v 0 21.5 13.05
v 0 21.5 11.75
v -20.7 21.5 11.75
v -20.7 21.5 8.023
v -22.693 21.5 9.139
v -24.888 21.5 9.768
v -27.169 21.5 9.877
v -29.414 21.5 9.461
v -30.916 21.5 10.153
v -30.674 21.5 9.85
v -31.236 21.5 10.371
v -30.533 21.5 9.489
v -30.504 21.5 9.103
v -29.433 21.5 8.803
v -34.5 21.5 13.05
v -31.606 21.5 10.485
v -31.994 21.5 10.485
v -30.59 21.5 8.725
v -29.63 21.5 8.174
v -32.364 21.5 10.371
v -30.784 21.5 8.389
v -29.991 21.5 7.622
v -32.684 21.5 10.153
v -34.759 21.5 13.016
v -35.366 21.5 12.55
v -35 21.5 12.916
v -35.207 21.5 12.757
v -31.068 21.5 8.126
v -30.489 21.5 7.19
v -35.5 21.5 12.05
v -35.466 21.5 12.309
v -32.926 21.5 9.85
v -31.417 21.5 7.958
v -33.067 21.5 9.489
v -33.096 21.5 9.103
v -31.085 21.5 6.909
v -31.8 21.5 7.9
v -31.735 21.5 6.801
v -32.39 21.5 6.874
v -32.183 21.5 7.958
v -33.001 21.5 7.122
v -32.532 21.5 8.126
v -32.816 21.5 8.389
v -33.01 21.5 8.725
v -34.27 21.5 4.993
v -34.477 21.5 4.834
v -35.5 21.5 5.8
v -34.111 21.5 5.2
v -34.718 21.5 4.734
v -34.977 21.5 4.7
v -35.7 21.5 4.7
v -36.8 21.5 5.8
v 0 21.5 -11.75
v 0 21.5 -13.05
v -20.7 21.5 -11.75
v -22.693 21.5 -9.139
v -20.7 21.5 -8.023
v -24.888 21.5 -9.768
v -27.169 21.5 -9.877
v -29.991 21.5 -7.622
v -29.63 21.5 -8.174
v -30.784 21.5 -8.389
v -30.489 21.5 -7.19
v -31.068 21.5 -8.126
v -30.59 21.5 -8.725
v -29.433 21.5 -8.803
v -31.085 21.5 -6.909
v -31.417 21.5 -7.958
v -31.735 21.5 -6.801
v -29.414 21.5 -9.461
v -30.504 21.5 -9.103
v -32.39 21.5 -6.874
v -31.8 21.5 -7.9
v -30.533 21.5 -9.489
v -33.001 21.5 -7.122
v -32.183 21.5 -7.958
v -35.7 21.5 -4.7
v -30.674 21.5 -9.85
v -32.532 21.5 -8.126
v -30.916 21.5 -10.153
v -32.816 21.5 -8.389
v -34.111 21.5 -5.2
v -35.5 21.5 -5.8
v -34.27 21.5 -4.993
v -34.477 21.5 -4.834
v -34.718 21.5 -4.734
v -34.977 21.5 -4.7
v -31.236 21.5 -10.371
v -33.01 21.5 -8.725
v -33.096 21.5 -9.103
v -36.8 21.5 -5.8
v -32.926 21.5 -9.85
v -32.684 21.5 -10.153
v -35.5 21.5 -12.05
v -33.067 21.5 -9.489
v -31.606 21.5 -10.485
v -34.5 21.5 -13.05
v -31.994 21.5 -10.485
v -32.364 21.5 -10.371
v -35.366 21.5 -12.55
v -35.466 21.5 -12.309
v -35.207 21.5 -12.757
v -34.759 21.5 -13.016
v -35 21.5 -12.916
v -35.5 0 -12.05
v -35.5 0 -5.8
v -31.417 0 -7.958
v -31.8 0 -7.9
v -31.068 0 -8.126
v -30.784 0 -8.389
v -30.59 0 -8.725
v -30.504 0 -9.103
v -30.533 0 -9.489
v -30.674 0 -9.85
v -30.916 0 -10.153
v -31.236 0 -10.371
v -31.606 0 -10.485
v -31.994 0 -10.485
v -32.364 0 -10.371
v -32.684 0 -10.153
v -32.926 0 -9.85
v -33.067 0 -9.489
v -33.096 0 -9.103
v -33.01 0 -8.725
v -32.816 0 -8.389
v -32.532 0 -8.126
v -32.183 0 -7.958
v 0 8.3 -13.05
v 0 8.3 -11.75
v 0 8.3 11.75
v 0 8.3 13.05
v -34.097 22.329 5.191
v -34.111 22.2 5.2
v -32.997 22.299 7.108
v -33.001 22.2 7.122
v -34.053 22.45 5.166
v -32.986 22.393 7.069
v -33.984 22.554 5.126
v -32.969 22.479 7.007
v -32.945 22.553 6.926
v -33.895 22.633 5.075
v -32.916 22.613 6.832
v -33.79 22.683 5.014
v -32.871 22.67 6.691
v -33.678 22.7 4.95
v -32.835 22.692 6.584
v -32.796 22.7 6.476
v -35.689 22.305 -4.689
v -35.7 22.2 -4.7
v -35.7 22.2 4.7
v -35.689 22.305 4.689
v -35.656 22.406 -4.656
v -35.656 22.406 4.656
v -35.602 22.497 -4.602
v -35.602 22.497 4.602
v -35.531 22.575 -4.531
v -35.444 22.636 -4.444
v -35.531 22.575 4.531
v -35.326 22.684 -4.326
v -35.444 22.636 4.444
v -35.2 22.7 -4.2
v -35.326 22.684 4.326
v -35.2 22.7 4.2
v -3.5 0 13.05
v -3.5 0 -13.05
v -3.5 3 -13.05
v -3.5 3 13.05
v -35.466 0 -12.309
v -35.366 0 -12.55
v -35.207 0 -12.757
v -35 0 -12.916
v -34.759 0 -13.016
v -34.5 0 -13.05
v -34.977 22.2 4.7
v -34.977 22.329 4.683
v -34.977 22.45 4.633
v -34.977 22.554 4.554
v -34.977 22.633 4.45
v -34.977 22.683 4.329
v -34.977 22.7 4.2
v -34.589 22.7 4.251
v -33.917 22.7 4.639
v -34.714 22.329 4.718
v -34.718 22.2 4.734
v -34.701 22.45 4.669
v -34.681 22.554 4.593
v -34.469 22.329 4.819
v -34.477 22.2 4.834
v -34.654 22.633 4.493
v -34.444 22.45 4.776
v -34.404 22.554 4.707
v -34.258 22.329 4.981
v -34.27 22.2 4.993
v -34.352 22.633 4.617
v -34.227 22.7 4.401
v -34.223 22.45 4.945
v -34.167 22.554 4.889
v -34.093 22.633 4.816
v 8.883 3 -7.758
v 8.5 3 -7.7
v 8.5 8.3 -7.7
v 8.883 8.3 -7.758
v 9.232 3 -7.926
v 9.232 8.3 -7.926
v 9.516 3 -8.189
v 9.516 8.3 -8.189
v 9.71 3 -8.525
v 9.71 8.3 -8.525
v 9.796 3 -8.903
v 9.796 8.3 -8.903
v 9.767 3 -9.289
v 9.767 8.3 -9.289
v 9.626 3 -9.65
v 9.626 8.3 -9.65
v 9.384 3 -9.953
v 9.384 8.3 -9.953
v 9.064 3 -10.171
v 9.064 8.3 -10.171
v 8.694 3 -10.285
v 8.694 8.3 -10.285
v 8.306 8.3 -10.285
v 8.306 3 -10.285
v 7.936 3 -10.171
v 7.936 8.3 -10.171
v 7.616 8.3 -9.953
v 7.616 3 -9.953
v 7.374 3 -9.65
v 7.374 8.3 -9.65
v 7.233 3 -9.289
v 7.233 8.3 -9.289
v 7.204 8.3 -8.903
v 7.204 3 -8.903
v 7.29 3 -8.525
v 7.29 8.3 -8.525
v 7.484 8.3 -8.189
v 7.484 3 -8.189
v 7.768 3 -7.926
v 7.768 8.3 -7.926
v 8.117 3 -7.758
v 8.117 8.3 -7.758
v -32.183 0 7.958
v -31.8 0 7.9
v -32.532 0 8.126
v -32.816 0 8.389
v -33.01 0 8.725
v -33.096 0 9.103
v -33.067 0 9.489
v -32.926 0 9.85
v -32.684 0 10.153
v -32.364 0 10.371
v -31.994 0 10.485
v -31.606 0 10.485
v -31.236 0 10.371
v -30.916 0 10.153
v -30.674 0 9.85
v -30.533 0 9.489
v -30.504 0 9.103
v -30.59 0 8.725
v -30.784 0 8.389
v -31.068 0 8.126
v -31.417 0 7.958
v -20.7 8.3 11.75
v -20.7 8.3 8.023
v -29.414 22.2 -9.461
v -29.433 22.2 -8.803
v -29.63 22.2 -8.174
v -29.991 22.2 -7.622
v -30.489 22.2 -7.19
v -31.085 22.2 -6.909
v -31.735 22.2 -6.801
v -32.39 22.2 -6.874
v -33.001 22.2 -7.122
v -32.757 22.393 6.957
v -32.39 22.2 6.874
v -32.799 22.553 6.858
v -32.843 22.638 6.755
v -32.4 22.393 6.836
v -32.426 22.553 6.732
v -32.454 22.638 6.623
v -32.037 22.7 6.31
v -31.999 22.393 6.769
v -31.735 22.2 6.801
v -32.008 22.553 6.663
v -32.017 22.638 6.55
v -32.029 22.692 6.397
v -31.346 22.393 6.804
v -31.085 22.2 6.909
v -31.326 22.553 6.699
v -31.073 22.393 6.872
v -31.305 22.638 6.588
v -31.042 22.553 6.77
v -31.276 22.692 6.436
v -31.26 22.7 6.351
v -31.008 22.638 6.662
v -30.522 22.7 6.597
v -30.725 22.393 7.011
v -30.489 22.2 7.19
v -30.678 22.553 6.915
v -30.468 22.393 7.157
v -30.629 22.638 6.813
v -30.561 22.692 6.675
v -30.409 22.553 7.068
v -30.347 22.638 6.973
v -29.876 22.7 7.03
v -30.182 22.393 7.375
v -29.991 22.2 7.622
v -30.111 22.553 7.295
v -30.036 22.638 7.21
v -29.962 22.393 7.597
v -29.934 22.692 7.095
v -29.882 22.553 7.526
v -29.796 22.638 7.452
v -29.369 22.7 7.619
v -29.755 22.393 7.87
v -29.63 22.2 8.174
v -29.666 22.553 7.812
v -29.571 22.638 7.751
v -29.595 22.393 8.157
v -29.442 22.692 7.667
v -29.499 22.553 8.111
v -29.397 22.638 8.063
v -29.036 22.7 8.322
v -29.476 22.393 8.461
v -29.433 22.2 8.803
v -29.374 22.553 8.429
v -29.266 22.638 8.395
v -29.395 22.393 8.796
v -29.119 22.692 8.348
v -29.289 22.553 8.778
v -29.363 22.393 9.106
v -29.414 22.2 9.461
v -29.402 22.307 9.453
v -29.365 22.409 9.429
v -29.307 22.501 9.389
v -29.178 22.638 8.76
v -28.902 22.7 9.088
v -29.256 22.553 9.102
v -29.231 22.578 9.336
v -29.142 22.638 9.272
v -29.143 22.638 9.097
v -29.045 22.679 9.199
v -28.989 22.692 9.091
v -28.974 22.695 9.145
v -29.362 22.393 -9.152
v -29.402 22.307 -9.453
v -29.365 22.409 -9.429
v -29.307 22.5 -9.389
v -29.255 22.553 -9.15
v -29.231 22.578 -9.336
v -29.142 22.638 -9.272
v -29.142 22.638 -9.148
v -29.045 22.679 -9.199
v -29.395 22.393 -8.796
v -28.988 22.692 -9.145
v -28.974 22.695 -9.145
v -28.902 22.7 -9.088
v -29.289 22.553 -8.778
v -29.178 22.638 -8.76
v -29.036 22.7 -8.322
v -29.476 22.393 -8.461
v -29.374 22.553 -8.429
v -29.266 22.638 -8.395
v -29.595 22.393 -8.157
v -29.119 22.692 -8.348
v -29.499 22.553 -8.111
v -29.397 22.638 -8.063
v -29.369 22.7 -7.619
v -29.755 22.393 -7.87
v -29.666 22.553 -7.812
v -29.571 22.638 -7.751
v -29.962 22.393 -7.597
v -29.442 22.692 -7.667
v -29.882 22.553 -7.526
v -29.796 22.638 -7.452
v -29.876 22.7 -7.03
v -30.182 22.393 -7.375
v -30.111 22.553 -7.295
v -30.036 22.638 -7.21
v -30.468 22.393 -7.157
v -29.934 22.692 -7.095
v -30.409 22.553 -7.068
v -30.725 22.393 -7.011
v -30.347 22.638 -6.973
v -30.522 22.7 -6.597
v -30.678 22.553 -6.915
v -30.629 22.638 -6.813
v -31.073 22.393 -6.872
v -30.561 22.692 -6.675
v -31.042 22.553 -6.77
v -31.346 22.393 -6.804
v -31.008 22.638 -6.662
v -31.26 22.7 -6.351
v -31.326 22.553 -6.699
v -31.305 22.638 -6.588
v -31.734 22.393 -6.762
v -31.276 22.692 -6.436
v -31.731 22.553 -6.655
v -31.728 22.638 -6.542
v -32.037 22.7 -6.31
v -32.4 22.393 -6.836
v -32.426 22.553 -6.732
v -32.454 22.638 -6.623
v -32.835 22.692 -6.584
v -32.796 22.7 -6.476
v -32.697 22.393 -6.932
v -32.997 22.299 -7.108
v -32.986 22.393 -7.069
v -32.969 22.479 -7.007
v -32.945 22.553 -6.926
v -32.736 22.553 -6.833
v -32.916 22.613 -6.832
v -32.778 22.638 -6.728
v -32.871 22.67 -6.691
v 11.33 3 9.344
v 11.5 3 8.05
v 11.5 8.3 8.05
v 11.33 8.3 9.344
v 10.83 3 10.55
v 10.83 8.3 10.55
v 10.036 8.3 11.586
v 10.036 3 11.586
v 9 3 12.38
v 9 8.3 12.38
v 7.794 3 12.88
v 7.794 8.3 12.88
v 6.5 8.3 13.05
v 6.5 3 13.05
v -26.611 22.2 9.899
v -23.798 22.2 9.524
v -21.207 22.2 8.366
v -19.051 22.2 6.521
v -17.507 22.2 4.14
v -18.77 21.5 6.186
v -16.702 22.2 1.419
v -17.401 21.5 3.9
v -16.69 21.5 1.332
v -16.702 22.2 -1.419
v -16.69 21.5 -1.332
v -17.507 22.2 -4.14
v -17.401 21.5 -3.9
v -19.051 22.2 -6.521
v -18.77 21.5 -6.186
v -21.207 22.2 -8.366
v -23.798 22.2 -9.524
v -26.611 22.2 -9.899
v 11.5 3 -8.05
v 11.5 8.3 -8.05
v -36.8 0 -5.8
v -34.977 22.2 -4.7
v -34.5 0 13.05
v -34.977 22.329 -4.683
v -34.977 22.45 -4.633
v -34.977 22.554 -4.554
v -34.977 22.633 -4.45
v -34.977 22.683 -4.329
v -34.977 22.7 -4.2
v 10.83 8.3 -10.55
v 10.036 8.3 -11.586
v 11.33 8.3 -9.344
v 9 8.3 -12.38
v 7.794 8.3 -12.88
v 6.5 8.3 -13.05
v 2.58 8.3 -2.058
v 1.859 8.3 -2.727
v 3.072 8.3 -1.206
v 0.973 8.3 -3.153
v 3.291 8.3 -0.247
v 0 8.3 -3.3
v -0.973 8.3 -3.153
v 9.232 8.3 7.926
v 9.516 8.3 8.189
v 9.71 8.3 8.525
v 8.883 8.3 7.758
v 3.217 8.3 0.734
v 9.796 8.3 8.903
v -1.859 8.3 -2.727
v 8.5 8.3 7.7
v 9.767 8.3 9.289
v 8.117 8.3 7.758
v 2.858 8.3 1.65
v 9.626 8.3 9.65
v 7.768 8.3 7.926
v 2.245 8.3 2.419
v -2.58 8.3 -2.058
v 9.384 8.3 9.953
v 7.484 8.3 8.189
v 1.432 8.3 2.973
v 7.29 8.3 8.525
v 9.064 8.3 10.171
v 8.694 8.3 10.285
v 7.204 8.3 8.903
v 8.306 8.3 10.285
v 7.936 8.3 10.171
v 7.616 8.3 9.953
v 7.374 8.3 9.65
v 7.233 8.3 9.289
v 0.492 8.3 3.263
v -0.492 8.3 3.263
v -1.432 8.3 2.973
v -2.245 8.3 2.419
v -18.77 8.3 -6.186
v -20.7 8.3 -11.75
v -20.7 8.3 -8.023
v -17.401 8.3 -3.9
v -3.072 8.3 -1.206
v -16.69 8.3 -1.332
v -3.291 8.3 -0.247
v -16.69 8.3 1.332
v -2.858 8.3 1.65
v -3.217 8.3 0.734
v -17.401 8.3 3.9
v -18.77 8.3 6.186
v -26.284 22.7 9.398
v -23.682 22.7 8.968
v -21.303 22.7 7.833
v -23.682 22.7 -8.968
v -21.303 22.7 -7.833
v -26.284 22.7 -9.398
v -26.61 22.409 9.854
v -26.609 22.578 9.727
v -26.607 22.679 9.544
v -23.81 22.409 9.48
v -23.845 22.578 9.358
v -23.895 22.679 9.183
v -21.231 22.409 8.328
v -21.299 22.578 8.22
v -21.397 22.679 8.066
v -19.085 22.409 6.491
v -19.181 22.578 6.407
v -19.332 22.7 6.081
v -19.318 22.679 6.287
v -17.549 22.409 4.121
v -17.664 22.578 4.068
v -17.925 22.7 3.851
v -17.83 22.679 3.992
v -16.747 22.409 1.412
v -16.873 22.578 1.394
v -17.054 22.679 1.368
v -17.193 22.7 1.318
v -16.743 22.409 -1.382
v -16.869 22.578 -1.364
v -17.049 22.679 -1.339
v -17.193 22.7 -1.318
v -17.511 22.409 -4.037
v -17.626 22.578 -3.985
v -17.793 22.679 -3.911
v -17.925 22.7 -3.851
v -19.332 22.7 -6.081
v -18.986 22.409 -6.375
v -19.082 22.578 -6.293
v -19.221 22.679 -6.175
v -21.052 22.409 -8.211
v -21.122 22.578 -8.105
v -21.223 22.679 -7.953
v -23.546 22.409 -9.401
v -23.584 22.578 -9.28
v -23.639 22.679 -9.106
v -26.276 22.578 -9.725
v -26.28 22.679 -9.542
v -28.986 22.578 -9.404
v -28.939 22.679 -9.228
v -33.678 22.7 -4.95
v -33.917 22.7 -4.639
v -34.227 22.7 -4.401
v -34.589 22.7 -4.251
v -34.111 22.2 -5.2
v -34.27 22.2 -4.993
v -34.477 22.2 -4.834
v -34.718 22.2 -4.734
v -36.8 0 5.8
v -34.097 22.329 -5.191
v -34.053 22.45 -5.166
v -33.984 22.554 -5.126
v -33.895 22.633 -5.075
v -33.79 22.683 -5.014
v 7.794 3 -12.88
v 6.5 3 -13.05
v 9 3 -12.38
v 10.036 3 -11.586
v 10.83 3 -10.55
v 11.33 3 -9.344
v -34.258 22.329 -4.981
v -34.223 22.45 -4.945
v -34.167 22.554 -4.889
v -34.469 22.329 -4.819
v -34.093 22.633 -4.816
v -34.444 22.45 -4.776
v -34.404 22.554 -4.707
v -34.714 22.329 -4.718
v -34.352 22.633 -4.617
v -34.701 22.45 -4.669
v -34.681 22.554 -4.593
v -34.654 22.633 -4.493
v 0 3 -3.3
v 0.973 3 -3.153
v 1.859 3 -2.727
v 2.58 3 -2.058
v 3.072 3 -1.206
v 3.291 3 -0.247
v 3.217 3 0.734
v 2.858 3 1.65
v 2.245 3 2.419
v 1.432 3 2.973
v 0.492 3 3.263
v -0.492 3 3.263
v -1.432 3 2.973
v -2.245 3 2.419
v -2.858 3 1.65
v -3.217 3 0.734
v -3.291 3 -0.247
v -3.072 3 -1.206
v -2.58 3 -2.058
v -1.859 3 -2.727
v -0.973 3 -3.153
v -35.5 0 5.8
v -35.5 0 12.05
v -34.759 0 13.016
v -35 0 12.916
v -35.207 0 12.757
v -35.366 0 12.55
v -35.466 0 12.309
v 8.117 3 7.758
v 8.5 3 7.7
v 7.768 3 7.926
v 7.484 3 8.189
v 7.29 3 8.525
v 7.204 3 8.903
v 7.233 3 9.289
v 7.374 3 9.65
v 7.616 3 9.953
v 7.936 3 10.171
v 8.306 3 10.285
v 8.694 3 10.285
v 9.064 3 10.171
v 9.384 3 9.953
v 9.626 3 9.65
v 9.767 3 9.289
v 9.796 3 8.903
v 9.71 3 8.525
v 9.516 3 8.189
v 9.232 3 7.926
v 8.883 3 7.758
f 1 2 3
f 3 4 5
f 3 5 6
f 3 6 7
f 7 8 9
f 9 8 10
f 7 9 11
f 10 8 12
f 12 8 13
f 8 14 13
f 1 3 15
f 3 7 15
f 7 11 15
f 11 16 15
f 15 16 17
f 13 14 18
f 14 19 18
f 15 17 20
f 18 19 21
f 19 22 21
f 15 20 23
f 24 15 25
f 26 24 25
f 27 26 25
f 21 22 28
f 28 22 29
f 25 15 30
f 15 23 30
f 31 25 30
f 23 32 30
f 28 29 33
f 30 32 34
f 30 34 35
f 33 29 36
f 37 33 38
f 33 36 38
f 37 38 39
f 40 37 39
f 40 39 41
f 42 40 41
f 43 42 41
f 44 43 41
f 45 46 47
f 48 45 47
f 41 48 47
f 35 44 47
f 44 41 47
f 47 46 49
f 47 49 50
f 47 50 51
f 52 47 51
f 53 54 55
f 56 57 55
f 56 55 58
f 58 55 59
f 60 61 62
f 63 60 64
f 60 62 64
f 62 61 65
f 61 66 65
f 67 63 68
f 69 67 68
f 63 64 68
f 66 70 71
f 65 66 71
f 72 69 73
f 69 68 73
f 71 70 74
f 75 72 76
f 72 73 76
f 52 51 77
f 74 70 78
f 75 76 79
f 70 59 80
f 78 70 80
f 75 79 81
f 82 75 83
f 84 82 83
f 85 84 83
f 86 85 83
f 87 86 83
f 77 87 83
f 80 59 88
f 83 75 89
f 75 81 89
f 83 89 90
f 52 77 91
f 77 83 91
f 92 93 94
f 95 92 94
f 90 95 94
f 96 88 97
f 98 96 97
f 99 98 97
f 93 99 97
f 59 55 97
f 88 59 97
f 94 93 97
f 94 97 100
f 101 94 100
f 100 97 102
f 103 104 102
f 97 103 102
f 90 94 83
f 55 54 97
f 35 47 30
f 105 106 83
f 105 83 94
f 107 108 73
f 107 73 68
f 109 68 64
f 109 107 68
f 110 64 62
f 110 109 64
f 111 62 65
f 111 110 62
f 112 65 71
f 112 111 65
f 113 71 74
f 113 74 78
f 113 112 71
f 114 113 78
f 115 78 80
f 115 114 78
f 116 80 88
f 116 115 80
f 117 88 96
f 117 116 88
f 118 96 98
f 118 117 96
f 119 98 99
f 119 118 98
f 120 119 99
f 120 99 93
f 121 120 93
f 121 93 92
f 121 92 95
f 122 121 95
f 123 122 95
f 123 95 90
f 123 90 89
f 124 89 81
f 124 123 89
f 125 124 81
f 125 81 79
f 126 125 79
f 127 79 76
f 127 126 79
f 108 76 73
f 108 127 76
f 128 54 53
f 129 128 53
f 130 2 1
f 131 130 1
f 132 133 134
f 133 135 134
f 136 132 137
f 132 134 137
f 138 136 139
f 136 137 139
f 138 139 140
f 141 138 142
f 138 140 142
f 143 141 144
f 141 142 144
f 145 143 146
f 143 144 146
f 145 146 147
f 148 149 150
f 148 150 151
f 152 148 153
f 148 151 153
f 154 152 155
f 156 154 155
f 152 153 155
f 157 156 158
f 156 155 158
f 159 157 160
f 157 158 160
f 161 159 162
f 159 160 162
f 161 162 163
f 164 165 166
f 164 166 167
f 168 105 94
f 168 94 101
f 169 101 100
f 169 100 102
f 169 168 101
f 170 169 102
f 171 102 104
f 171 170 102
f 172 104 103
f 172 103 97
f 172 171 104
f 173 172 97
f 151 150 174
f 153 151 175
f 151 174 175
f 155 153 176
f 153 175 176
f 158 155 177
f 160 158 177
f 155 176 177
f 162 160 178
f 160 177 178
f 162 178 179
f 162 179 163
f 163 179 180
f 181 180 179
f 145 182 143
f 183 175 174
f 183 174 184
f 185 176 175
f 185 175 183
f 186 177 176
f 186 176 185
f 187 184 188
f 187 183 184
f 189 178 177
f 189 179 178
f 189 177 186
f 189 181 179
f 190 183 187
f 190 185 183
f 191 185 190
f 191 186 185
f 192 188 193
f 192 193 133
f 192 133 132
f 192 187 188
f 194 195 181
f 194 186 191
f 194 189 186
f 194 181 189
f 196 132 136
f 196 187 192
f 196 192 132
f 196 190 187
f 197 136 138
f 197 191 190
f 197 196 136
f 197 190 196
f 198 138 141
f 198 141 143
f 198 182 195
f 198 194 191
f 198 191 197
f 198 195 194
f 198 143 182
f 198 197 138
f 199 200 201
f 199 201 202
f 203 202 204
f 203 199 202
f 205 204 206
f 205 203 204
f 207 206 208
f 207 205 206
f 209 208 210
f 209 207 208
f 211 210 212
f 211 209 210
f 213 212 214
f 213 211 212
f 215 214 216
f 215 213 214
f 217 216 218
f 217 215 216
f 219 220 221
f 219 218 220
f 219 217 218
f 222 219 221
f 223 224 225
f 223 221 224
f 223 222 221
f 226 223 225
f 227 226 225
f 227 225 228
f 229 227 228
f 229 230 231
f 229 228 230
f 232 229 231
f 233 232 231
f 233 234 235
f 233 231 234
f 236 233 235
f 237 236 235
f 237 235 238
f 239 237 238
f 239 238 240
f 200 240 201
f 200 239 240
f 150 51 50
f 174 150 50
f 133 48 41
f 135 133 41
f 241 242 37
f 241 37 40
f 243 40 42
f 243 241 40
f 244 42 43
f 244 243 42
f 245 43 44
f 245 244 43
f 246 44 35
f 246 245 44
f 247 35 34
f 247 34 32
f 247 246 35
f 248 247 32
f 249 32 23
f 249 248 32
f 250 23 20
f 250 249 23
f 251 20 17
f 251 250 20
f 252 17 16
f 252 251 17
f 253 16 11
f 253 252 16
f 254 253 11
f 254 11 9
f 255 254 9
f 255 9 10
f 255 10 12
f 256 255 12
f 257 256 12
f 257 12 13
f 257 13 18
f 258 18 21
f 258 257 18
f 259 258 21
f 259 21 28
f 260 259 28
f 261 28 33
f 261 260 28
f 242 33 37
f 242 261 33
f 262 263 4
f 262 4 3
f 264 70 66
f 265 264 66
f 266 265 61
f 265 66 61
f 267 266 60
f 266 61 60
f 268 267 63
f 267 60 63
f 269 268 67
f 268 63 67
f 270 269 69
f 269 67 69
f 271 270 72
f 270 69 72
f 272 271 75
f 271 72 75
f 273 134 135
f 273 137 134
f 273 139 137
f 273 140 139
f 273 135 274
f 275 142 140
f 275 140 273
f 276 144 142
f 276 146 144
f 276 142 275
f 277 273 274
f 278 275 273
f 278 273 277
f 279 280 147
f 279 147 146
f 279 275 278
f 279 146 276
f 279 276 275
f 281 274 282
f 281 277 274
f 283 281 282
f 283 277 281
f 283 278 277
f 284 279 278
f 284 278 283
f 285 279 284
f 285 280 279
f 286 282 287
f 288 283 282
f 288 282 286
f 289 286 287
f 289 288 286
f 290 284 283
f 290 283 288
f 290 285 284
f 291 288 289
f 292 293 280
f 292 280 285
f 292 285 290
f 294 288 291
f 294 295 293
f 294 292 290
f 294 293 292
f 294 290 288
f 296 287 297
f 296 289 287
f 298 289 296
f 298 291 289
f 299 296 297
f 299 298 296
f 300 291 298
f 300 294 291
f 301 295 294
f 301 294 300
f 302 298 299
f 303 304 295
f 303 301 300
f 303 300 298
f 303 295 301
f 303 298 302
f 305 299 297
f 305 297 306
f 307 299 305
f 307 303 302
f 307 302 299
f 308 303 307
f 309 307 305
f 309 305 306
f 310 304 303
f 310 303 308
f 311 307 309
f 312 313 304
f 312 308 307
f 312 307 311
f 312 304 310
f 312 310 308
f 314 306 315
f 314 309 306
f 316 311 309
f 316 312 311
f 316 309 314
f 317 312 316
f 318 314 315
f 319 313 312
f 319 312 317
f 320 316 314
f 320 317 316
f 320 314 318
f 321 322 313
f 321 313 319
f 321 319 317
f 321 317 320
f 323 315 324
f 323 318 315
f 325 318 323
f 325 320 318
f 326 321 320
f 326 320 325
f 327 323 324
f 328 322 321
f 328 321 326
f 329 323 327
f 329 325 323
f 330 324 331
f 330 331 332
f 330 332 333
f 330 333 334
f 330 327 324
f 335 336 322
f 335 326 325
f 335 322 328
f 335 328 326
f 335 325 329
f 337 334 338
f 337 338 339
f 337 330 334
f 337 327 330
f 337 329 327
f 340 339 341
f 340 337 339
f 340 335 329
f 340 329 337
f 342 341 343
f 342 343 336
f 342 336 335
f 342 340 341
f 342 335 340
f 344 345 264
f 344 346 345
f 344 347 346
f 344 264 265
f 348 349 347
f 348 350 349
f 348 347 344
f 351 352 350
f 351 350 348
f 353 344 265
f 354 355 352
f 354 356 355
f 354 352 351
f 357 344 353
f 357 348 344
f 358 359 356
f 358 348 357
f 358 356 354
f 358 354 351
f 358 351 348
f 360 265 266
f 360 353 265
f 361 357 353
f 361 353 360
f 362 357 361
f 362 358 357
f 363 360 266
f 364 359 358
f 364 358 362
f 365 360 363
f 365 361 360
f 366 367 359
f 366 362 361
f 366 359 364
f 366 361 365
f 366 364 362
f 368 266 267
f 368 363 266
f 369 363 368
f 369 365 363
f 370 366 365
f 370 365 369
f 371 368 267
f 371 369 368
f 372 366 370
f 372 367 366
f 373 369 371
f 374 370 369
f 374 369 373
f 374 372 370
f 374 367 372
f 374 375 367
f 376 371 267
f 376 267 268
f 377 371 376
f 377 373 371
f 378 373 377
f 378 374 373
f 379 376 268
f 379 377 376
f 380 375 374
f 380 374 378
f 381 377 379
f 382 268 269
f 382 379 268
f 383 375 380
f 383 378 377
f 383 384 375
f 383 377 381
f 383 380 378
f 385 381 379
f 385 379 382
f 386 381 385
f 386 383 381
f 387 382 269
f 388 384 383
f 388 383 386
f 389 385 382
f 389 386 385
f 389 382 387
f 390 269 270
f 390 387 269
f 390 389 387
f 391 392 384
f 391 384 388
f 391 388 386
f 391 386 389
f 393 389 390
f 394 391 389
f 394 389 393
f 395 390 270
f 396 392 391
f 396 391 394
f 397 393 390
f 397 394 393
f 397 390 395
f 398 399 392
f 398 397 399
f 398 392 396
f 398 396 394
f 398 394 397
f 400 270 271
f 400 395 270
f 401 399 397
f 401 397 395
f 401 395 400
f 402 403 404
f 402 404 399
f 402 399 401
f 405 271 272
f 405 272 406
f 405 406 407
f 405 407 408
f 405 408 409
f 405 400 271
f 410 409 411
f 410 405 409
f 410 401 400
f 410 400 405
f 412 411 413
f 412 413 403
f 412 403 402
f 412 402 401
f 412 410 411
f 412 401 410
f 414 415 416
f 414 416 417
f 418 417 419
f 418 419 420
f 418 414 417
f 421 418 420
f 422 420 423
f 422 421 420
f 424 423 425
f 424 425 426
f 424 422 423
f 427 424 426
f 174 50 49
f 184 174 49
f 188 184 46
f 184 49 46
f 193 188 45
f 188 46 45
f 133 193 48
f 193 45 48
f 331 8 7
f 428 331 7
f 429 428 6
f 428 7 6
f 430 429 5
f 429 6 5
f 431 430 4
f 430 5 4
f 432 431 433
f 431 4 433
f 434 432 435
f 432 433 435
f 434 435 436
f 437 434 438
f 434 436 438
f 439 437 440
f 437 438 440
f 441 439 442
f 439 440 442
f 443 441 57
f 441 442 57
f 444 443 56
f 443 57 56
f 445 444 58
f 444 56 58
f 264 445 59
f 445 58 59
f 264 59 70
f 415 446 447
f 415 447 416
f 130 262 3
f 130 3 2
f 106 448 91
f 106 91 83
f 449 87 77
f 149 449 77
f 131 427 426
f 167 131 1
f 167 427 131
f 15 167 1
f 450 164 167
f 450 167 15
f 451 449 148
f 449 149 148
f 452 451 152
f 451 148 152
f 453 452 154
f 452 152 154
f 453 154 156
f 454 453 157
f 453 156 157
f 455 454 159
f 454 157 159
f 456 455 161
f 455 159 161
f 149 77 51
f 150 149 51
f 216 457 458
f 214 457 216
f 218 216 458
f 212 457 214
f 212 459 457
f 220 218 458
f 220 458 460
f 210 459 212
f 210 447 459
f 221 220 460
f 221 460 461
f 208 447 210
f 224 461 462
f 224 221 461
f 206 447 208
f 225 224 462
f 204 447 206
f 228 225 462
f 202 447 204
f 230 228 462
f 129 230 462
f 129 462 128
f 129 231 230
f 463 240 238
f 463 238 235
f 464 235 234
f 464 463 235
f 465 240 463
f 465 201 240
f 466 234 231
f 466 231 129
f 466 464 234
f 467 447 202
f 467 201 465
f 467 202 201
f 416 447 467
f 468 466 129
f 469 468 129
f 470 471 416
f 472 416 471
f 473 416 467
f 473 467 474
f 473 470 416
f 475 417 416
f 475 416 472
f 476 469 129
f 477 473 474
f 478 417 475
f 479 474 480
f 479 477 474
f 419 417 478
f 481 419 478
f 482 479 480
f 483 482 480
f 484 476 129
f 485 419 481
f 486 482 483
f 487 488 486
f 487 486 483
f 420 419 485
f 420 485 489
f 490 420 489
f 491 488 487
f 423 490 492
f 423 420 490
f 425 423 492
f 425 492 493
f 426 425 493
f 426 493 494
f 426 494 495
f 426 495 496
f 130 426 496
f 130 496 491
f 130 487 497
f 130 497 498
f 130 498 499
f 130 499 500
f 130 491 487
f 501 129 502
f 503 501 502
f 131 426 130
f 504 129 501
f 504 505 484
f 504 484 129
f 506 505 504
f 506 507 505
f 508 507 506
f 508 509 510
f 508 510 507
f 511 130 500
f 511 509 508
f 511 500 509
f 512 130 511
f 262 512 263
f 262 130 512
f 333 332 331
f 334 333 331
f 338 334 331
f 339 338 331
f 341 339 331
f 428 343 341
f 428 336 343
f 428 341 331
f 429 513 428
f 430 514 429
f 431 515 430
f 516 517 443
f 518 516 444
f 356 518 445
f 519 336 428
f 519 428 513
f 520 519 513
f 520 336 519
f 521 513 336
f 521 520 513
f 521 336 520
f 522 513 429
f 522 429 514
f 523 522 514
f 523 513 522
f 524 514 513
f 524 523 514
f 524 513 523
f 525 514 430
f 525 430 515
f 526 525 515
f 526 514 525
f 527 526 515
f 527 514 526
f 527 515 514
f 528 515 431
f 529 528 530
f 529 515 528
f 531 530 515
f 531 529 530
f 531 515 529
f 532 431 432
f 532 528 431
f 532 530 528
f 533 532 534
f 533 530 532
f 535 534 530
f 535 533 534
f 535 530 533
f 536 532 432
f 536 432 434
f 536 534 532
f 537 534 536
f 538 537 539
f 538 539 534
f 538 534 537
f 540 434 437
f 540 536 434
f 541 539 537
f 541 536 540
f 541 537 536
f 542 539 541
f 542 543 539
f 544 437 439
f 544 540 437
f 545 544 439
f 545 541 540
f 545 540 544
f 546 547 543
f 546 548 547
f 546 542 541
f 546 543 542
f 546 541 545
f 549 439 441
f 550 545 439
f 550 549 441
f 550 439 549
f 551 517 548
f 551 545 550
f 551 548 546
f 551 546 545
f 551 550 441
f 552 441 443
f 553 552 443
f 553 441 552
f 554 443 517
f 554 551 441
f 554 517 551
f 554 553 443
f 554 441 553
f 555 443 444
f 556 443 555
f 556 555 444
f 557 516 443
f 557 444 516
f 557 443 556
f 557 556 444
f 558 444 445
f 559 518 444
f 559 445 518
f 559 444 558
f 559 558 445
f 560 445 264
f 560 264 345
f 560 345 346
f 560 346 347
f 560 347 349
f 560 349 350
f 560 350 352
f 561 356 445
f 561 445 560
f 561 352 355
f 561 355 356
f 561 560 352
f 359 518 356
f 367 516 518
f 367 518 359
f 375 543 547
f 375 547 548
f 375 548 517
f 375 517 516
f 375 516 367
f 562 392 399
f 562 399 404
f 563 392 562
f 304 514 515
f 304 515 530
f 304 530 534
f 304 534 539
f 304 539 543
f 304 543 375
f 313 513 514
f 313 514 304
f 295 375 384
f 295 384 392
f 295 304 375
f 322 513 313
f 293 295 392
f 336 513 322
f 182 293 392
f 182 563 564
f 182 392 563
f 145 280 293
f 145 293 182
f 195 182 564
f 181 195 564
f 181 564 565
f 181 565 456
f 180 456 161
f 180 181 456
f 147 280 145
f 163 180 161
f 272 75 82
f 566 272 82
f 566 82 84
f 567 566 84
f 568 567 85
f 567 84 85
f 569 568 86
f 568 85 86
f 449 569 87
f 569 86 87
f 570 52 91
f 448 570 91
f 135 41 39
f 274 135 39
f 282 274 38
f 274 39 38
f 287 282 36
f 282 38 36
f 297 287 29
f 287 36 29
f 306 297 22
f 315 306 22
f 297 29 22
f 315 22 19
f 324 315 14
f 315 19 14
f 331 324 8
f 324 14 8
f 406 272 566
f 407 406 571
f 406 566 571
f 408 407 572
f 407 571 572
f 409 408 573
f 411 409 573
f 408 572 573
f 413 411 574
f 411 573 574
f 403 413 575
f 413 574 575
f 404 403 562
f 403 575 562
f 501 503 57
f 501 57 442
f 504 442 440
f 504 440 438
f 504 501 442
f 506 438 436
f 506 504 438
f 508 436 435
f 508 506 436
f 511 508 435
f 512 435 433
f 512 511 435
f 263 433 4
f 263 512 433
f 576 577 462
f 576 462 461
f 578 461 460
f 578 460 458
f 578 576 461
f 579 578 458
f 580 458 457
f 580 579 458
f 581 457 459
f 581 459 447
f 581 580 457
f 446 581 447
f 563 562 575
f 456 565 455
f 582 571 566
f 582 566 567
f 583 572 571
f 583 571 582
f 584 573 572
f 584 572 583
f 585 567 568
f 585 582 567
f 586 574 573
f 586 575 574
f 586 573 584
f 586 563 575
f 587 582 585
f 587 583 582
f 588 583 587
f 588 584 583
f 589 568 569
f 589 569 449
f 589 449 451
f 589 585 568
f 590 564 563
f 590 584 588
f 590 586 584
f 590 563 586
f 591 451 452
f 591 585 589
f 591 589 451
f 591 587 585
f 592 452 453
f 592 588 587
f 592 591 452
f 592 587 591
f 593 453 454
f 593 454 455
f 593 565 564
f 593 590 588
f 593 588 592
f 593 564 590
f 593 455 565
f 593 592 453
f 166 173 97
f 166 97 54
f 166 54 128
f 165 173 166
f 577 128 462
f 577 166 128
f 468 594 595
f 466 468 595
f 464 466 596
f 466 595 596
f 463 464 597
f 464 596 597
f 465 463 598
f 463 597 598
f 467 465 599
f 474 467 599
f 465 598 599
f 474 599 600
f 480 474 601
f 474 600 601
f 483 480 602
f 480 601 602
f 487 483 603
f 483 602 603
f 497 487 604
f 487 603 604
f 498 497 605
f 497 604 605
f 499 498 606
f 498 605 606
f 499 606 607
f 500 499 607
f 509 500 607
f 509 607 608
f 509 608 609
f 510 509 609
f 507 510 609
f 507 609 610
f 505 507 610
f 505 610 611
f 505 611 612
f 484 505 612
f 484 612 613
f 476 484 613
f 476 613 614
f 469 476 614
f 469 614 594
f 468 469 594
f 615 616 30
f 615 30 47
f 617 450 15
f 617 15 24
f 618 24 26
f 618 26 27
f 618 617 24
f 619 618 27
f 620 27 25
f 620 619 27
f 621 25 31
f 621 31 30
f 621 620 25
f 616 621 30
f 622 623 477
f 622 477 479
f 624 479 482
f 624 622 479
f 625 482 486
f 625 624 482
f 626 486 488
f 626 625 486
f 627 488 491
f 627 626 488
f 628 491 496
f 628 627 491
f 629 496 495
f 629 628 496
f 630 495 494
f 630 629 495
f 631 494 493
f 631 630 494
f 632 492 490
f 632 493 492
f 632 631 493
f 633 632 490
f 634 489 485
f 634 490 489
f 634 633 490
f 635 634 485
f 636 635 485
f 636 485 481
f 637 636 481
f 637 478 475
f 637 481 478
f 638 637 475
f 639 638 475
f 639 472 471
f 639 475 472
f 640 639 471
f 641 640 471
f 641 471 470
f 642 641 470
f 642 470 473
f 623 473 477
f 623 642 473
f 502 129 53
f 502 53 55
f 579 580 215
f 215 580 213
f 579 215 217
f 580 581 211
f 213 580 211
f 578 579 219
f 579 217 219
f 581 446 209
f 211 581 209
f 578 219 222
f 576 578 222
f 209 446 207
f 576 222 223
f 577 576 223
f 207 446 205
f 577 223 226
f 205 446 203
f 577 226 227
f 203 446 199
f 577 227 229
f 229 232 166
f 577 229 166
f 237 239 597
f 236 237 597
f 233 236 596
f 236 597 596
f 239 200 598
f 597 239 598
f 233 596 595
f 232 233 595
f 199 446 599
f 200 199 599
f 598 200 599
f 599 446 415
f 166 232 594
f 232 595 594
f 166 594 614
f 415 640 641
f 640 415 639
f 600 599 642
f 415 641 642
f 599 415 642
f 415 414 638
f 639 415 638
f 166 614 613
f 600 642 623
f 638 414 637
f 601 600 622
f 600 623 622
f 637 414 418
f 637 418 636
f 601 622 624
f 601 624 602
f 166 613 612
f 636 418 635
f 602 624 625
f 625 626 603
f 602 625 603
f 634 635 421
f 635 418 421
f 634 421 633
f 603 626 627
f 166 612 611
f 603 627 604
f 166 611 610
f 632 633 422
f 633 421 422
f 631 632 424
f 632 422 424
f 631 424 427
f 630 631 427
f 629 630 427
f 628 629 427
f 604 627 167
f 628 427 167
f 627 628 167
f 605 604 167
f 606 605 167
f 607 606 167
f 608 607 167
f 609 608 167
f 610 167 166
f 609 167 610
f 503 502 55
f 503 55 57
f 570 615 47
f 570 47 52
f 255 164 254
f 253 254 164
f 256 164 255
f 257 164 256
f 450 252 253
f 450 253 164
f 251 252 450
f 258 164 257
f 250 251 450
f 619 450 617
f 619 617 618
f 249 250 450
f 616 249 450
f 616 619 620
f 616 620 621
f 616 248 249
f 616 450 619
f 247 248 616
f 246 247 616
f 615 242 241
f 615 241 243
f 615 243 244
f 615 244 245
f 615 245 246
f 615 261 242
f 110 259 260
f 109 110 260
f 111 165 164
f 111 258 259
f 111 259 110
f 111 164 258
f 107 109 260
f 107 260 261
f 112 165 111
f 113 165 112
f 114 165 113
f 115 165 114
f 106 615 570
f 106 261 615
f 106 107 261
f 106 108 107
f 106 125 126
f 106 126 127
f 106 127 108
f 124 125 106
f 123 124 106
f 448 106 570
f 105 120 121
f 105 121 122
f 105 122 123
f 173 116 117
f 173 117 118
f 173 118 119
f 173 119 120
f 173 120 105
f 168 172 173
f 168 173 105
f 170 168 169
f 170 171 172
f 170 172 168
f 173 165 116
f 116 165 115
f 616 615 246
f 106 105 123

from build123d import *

# Parameters (mm, degrees)
SKETCH1_R          = 1.3
EXTRUDE1_DEPTH     = 21.5
EXTRUDE2_DEPTH     = 1.2
FILLET1_R          = 0.5
SKETCH4_W          = 11.5
SKETCH4_H          = 26.1
CUT_EXTRUDE2_DEPTH = 13.2
CUT_EXTRUDE3_DEPTH = 3
CUT_EXTRUDE4_START = -13.2
CUT_EXTRUDE4_DEPTH = 13.2
SKETCH6_R          = 3.3
CUT_EXTRUDE5_DEPTH = 46.164504919


with BuildPart() as part:
    # Sketch1 → Extrude1 (new body)
    with BuildSketch(Plane(origin=(0, 0, 0), x_dir=(1, 0, 0), z_dir=(0, 1, 0))):
        with BuildLine():
            Line((-34.5, 13.05), (6.5, 13.05))
            ThreePointArc((6.5, 13.05), (10.035533906, 11.585533906), (11.5, 8.05))
            Line((11.5, 8.05), (11.5, -8.05))
            ThreePointArc((11.5, -8.05), (10.035533906, -11.585533906), (6.5, -13.05))
            Line((6.5, -13.05), (-34.5, -13.05))
            ThreePointArc((-34.5, -13.05), (-35.207106781, -12.757106781), (-35.5, -12.05))
            Line((-35.5, -12.05), (-35.5, -5.8))
            Line((-35.5, -5.8), (-36.8, -5.8))
            Line((-36.8, -5.8), (-36.8, 5.8))
            Line((-36.8, 5.8), (-35.5, 5.8))
            Line((-35.5, 5.8), (-35.5, 12.05))
            ThreePointArc((-35.5, 12.05), (-35.207106781, 12.757106781), (-34.5, 13.05))
        make_face()
        with Locations(Location((-31.8, 9.2, 0), (0, 0, 270))):
            Circle(SKETCH1_R, mode=Mode.SUBTRACT)
        with Locations(Location((8.5, 9, 0), (0, 0, 270))):
            Circle(SKETCH1_R, mode=Mode.SUBTRACT)
        with Locations(Location((8.5, -9, 0), (0, 0, 90))):
            Circle(SKETCH1_R, mode=Mode.SUBTRACT)
        with Locations(Location((-31.8, -9.2, 0), (0, 0, 90))):
            Circle(SKETCH1_R, mode=Mode.SUBTRACT)
    extrude(amount=EXTRUDE1_DEPTH)

    # Sketch2 → Extrude2 (add)
    with BuildSketch(Plane(origin=(0, 21.5, 0), x_dir=(-1, 0, 0), z_dir=(0, 1, 0))):
        with BuildLine():
            Line((33.000666235, -7.121923824), (34.111271501, -5.199722402))
            ThreePointArc((34.111271501, -5.199722402), (34.477275392, -4.833894464), (34.977136574, -4.7))
            Line((34.977136574, -4.7), (35.7, -4.7))
            Line((35.7, -4.7), (35.7, 4.7))
            Line((35.7, 4.7), (34.977136574, 4.7))
            ThreePointArc((34.977136574, 4.7), (34.477275392, 4.833894464), (34.111271501, 5.199722402))
            Line((34.111271501, 5.199722402), (33.000666235, 7.121923824))
            ThreePointArc((33.000666235, 7.121923824), (30.488773811, 7.189854264), (29.414271687, 9.461343485))
            ThreePointArc((29.414271687, 9.461343485), (16.6, 0), (29.414271687, -9.461343485))
            ThreePointArc((29.414271687, -9.461343485), (30.488773811, -7.189854264), (33.000666235, -7.121923824))
        make_face()
    extrude(amount=EXTRUDE2_DEPTH)

    # Fillet1
    fillet1_edges = [part.edges().sort_by_distance(p)[0] for p in [
        (-30.488773811, 22.7, 7.189854264),
        (-16.6, 22.7, 0),
        (-30.488773811, 22.7, -7.189854264),
        (-33.555968868, 22.7, -6.160823113),
        (-34.477275392, 22.7, -4.833894464),
        (-35.338568287, 22.7, -4.7),
        (-35.7, 22.7, 0),
        (-35.338568287, 22.7, 4.7),
        (-34.477275392, 22.7, 4.833894464),
        (-33.555968868, 22.7, 6.160823113),
    ]]
    fillet(fillet1_edges, radius=FILLET1_R)

    # Sketch4 → Cut-Extrude2 (cut)
    with BuildSketch(Plane(origin=(0, 21.5, 0), x_dir=(-1, 0, 0), z_dir=(0, 1, 0))):
        with Locations((-5.75, 0)):
            Rectangle(SKETCH4_W, SKETCH4_H)
    extrude(amount=-CUT_EXTRUDE2_DEPTH, mode=Mode.SUBTRACT)

    # Sketch5 → Cut-Extrude3 (cut)
    with BuildSketch(Plane.XZ):
        with BuildLine():
            Line((-3.5, -13.05), (-3.5, 13.05))
            Line((-3.5, 13.05), (6.5, 13.05))
            ThreePointArc((6.5, 13.05), (10.035533906, 11.585533906), (11.5, 8.05))
            Line((11.5, 8.05), (11.5, -8.05))
            ThreePointArc((11.5, -8.05), (10.035533906, -11.585533906), (6.5, -13.05))
            Line((6.5, -13.05), (-3.5, -13.05))
        make_face()
    extrude(amount=-CUT_EXTRUDE3_DEPTH, mode=Mode.SUBTRACT)

    # Sketch3 → Cut-Extrude4 (cut)
    with BuildSketch(Plane(origin=(0, 21.5, 0), x_dir=(-1, 0, 0), z_dir=(0, 1, 0)).offset(CUT_EXTRUDE4_START)):
        with BuildLine():
            Line((20.7, 8.023091673), (20.7, 11.75))
            Line((20.7, 11.75), (-6.5, 11.75))
            ThreePointArc((-6.5, 11.75), (-7.422418806, 11.633175065), (-8.286588144, 11.290077592))
            ThreePointArc((-8.286588144, 11.290077592), (-6.441484419, 7.974079144), (-10.2, 7.450806662))
            Line((-10.2, 7.450806662), (-10.2, -7.450806662))
            ThreePointArc((-10.2, -7.450806662), (-6.441484419, -7.974079144), (-8.286588144, -11.290077592))
            ThreePointArc((-8.286588144, -11.290077592), (-7.422418806, -11.633175065), (-6.5, -11.75))
            Line((-6.5, -11.75), (20.7, -11.75))
            Line((20.7, -11.75), (20.7, -8.023091673))
            ThreePointArc((20.7, -8.023091673), (16.6, 0), (20.7, 8.023091673))
        make_face()
    extrude(amount=CUT_EXTRUDE4_DEPTH, mode=Mode.SUBTRACT)

    # Sketch6 → Cut-Extrude5 (cut, through all)
    with BuildSketch(Plane.XZ):
        with Locations(Location((0, 0, 0), (0, 0, 270))):
            Circle(SKETCH6_R)
    extrude(amount=-CUT_EXTRUDE5_DEPTH, mode=Mode.SUBTRACT)


solid = part.part
